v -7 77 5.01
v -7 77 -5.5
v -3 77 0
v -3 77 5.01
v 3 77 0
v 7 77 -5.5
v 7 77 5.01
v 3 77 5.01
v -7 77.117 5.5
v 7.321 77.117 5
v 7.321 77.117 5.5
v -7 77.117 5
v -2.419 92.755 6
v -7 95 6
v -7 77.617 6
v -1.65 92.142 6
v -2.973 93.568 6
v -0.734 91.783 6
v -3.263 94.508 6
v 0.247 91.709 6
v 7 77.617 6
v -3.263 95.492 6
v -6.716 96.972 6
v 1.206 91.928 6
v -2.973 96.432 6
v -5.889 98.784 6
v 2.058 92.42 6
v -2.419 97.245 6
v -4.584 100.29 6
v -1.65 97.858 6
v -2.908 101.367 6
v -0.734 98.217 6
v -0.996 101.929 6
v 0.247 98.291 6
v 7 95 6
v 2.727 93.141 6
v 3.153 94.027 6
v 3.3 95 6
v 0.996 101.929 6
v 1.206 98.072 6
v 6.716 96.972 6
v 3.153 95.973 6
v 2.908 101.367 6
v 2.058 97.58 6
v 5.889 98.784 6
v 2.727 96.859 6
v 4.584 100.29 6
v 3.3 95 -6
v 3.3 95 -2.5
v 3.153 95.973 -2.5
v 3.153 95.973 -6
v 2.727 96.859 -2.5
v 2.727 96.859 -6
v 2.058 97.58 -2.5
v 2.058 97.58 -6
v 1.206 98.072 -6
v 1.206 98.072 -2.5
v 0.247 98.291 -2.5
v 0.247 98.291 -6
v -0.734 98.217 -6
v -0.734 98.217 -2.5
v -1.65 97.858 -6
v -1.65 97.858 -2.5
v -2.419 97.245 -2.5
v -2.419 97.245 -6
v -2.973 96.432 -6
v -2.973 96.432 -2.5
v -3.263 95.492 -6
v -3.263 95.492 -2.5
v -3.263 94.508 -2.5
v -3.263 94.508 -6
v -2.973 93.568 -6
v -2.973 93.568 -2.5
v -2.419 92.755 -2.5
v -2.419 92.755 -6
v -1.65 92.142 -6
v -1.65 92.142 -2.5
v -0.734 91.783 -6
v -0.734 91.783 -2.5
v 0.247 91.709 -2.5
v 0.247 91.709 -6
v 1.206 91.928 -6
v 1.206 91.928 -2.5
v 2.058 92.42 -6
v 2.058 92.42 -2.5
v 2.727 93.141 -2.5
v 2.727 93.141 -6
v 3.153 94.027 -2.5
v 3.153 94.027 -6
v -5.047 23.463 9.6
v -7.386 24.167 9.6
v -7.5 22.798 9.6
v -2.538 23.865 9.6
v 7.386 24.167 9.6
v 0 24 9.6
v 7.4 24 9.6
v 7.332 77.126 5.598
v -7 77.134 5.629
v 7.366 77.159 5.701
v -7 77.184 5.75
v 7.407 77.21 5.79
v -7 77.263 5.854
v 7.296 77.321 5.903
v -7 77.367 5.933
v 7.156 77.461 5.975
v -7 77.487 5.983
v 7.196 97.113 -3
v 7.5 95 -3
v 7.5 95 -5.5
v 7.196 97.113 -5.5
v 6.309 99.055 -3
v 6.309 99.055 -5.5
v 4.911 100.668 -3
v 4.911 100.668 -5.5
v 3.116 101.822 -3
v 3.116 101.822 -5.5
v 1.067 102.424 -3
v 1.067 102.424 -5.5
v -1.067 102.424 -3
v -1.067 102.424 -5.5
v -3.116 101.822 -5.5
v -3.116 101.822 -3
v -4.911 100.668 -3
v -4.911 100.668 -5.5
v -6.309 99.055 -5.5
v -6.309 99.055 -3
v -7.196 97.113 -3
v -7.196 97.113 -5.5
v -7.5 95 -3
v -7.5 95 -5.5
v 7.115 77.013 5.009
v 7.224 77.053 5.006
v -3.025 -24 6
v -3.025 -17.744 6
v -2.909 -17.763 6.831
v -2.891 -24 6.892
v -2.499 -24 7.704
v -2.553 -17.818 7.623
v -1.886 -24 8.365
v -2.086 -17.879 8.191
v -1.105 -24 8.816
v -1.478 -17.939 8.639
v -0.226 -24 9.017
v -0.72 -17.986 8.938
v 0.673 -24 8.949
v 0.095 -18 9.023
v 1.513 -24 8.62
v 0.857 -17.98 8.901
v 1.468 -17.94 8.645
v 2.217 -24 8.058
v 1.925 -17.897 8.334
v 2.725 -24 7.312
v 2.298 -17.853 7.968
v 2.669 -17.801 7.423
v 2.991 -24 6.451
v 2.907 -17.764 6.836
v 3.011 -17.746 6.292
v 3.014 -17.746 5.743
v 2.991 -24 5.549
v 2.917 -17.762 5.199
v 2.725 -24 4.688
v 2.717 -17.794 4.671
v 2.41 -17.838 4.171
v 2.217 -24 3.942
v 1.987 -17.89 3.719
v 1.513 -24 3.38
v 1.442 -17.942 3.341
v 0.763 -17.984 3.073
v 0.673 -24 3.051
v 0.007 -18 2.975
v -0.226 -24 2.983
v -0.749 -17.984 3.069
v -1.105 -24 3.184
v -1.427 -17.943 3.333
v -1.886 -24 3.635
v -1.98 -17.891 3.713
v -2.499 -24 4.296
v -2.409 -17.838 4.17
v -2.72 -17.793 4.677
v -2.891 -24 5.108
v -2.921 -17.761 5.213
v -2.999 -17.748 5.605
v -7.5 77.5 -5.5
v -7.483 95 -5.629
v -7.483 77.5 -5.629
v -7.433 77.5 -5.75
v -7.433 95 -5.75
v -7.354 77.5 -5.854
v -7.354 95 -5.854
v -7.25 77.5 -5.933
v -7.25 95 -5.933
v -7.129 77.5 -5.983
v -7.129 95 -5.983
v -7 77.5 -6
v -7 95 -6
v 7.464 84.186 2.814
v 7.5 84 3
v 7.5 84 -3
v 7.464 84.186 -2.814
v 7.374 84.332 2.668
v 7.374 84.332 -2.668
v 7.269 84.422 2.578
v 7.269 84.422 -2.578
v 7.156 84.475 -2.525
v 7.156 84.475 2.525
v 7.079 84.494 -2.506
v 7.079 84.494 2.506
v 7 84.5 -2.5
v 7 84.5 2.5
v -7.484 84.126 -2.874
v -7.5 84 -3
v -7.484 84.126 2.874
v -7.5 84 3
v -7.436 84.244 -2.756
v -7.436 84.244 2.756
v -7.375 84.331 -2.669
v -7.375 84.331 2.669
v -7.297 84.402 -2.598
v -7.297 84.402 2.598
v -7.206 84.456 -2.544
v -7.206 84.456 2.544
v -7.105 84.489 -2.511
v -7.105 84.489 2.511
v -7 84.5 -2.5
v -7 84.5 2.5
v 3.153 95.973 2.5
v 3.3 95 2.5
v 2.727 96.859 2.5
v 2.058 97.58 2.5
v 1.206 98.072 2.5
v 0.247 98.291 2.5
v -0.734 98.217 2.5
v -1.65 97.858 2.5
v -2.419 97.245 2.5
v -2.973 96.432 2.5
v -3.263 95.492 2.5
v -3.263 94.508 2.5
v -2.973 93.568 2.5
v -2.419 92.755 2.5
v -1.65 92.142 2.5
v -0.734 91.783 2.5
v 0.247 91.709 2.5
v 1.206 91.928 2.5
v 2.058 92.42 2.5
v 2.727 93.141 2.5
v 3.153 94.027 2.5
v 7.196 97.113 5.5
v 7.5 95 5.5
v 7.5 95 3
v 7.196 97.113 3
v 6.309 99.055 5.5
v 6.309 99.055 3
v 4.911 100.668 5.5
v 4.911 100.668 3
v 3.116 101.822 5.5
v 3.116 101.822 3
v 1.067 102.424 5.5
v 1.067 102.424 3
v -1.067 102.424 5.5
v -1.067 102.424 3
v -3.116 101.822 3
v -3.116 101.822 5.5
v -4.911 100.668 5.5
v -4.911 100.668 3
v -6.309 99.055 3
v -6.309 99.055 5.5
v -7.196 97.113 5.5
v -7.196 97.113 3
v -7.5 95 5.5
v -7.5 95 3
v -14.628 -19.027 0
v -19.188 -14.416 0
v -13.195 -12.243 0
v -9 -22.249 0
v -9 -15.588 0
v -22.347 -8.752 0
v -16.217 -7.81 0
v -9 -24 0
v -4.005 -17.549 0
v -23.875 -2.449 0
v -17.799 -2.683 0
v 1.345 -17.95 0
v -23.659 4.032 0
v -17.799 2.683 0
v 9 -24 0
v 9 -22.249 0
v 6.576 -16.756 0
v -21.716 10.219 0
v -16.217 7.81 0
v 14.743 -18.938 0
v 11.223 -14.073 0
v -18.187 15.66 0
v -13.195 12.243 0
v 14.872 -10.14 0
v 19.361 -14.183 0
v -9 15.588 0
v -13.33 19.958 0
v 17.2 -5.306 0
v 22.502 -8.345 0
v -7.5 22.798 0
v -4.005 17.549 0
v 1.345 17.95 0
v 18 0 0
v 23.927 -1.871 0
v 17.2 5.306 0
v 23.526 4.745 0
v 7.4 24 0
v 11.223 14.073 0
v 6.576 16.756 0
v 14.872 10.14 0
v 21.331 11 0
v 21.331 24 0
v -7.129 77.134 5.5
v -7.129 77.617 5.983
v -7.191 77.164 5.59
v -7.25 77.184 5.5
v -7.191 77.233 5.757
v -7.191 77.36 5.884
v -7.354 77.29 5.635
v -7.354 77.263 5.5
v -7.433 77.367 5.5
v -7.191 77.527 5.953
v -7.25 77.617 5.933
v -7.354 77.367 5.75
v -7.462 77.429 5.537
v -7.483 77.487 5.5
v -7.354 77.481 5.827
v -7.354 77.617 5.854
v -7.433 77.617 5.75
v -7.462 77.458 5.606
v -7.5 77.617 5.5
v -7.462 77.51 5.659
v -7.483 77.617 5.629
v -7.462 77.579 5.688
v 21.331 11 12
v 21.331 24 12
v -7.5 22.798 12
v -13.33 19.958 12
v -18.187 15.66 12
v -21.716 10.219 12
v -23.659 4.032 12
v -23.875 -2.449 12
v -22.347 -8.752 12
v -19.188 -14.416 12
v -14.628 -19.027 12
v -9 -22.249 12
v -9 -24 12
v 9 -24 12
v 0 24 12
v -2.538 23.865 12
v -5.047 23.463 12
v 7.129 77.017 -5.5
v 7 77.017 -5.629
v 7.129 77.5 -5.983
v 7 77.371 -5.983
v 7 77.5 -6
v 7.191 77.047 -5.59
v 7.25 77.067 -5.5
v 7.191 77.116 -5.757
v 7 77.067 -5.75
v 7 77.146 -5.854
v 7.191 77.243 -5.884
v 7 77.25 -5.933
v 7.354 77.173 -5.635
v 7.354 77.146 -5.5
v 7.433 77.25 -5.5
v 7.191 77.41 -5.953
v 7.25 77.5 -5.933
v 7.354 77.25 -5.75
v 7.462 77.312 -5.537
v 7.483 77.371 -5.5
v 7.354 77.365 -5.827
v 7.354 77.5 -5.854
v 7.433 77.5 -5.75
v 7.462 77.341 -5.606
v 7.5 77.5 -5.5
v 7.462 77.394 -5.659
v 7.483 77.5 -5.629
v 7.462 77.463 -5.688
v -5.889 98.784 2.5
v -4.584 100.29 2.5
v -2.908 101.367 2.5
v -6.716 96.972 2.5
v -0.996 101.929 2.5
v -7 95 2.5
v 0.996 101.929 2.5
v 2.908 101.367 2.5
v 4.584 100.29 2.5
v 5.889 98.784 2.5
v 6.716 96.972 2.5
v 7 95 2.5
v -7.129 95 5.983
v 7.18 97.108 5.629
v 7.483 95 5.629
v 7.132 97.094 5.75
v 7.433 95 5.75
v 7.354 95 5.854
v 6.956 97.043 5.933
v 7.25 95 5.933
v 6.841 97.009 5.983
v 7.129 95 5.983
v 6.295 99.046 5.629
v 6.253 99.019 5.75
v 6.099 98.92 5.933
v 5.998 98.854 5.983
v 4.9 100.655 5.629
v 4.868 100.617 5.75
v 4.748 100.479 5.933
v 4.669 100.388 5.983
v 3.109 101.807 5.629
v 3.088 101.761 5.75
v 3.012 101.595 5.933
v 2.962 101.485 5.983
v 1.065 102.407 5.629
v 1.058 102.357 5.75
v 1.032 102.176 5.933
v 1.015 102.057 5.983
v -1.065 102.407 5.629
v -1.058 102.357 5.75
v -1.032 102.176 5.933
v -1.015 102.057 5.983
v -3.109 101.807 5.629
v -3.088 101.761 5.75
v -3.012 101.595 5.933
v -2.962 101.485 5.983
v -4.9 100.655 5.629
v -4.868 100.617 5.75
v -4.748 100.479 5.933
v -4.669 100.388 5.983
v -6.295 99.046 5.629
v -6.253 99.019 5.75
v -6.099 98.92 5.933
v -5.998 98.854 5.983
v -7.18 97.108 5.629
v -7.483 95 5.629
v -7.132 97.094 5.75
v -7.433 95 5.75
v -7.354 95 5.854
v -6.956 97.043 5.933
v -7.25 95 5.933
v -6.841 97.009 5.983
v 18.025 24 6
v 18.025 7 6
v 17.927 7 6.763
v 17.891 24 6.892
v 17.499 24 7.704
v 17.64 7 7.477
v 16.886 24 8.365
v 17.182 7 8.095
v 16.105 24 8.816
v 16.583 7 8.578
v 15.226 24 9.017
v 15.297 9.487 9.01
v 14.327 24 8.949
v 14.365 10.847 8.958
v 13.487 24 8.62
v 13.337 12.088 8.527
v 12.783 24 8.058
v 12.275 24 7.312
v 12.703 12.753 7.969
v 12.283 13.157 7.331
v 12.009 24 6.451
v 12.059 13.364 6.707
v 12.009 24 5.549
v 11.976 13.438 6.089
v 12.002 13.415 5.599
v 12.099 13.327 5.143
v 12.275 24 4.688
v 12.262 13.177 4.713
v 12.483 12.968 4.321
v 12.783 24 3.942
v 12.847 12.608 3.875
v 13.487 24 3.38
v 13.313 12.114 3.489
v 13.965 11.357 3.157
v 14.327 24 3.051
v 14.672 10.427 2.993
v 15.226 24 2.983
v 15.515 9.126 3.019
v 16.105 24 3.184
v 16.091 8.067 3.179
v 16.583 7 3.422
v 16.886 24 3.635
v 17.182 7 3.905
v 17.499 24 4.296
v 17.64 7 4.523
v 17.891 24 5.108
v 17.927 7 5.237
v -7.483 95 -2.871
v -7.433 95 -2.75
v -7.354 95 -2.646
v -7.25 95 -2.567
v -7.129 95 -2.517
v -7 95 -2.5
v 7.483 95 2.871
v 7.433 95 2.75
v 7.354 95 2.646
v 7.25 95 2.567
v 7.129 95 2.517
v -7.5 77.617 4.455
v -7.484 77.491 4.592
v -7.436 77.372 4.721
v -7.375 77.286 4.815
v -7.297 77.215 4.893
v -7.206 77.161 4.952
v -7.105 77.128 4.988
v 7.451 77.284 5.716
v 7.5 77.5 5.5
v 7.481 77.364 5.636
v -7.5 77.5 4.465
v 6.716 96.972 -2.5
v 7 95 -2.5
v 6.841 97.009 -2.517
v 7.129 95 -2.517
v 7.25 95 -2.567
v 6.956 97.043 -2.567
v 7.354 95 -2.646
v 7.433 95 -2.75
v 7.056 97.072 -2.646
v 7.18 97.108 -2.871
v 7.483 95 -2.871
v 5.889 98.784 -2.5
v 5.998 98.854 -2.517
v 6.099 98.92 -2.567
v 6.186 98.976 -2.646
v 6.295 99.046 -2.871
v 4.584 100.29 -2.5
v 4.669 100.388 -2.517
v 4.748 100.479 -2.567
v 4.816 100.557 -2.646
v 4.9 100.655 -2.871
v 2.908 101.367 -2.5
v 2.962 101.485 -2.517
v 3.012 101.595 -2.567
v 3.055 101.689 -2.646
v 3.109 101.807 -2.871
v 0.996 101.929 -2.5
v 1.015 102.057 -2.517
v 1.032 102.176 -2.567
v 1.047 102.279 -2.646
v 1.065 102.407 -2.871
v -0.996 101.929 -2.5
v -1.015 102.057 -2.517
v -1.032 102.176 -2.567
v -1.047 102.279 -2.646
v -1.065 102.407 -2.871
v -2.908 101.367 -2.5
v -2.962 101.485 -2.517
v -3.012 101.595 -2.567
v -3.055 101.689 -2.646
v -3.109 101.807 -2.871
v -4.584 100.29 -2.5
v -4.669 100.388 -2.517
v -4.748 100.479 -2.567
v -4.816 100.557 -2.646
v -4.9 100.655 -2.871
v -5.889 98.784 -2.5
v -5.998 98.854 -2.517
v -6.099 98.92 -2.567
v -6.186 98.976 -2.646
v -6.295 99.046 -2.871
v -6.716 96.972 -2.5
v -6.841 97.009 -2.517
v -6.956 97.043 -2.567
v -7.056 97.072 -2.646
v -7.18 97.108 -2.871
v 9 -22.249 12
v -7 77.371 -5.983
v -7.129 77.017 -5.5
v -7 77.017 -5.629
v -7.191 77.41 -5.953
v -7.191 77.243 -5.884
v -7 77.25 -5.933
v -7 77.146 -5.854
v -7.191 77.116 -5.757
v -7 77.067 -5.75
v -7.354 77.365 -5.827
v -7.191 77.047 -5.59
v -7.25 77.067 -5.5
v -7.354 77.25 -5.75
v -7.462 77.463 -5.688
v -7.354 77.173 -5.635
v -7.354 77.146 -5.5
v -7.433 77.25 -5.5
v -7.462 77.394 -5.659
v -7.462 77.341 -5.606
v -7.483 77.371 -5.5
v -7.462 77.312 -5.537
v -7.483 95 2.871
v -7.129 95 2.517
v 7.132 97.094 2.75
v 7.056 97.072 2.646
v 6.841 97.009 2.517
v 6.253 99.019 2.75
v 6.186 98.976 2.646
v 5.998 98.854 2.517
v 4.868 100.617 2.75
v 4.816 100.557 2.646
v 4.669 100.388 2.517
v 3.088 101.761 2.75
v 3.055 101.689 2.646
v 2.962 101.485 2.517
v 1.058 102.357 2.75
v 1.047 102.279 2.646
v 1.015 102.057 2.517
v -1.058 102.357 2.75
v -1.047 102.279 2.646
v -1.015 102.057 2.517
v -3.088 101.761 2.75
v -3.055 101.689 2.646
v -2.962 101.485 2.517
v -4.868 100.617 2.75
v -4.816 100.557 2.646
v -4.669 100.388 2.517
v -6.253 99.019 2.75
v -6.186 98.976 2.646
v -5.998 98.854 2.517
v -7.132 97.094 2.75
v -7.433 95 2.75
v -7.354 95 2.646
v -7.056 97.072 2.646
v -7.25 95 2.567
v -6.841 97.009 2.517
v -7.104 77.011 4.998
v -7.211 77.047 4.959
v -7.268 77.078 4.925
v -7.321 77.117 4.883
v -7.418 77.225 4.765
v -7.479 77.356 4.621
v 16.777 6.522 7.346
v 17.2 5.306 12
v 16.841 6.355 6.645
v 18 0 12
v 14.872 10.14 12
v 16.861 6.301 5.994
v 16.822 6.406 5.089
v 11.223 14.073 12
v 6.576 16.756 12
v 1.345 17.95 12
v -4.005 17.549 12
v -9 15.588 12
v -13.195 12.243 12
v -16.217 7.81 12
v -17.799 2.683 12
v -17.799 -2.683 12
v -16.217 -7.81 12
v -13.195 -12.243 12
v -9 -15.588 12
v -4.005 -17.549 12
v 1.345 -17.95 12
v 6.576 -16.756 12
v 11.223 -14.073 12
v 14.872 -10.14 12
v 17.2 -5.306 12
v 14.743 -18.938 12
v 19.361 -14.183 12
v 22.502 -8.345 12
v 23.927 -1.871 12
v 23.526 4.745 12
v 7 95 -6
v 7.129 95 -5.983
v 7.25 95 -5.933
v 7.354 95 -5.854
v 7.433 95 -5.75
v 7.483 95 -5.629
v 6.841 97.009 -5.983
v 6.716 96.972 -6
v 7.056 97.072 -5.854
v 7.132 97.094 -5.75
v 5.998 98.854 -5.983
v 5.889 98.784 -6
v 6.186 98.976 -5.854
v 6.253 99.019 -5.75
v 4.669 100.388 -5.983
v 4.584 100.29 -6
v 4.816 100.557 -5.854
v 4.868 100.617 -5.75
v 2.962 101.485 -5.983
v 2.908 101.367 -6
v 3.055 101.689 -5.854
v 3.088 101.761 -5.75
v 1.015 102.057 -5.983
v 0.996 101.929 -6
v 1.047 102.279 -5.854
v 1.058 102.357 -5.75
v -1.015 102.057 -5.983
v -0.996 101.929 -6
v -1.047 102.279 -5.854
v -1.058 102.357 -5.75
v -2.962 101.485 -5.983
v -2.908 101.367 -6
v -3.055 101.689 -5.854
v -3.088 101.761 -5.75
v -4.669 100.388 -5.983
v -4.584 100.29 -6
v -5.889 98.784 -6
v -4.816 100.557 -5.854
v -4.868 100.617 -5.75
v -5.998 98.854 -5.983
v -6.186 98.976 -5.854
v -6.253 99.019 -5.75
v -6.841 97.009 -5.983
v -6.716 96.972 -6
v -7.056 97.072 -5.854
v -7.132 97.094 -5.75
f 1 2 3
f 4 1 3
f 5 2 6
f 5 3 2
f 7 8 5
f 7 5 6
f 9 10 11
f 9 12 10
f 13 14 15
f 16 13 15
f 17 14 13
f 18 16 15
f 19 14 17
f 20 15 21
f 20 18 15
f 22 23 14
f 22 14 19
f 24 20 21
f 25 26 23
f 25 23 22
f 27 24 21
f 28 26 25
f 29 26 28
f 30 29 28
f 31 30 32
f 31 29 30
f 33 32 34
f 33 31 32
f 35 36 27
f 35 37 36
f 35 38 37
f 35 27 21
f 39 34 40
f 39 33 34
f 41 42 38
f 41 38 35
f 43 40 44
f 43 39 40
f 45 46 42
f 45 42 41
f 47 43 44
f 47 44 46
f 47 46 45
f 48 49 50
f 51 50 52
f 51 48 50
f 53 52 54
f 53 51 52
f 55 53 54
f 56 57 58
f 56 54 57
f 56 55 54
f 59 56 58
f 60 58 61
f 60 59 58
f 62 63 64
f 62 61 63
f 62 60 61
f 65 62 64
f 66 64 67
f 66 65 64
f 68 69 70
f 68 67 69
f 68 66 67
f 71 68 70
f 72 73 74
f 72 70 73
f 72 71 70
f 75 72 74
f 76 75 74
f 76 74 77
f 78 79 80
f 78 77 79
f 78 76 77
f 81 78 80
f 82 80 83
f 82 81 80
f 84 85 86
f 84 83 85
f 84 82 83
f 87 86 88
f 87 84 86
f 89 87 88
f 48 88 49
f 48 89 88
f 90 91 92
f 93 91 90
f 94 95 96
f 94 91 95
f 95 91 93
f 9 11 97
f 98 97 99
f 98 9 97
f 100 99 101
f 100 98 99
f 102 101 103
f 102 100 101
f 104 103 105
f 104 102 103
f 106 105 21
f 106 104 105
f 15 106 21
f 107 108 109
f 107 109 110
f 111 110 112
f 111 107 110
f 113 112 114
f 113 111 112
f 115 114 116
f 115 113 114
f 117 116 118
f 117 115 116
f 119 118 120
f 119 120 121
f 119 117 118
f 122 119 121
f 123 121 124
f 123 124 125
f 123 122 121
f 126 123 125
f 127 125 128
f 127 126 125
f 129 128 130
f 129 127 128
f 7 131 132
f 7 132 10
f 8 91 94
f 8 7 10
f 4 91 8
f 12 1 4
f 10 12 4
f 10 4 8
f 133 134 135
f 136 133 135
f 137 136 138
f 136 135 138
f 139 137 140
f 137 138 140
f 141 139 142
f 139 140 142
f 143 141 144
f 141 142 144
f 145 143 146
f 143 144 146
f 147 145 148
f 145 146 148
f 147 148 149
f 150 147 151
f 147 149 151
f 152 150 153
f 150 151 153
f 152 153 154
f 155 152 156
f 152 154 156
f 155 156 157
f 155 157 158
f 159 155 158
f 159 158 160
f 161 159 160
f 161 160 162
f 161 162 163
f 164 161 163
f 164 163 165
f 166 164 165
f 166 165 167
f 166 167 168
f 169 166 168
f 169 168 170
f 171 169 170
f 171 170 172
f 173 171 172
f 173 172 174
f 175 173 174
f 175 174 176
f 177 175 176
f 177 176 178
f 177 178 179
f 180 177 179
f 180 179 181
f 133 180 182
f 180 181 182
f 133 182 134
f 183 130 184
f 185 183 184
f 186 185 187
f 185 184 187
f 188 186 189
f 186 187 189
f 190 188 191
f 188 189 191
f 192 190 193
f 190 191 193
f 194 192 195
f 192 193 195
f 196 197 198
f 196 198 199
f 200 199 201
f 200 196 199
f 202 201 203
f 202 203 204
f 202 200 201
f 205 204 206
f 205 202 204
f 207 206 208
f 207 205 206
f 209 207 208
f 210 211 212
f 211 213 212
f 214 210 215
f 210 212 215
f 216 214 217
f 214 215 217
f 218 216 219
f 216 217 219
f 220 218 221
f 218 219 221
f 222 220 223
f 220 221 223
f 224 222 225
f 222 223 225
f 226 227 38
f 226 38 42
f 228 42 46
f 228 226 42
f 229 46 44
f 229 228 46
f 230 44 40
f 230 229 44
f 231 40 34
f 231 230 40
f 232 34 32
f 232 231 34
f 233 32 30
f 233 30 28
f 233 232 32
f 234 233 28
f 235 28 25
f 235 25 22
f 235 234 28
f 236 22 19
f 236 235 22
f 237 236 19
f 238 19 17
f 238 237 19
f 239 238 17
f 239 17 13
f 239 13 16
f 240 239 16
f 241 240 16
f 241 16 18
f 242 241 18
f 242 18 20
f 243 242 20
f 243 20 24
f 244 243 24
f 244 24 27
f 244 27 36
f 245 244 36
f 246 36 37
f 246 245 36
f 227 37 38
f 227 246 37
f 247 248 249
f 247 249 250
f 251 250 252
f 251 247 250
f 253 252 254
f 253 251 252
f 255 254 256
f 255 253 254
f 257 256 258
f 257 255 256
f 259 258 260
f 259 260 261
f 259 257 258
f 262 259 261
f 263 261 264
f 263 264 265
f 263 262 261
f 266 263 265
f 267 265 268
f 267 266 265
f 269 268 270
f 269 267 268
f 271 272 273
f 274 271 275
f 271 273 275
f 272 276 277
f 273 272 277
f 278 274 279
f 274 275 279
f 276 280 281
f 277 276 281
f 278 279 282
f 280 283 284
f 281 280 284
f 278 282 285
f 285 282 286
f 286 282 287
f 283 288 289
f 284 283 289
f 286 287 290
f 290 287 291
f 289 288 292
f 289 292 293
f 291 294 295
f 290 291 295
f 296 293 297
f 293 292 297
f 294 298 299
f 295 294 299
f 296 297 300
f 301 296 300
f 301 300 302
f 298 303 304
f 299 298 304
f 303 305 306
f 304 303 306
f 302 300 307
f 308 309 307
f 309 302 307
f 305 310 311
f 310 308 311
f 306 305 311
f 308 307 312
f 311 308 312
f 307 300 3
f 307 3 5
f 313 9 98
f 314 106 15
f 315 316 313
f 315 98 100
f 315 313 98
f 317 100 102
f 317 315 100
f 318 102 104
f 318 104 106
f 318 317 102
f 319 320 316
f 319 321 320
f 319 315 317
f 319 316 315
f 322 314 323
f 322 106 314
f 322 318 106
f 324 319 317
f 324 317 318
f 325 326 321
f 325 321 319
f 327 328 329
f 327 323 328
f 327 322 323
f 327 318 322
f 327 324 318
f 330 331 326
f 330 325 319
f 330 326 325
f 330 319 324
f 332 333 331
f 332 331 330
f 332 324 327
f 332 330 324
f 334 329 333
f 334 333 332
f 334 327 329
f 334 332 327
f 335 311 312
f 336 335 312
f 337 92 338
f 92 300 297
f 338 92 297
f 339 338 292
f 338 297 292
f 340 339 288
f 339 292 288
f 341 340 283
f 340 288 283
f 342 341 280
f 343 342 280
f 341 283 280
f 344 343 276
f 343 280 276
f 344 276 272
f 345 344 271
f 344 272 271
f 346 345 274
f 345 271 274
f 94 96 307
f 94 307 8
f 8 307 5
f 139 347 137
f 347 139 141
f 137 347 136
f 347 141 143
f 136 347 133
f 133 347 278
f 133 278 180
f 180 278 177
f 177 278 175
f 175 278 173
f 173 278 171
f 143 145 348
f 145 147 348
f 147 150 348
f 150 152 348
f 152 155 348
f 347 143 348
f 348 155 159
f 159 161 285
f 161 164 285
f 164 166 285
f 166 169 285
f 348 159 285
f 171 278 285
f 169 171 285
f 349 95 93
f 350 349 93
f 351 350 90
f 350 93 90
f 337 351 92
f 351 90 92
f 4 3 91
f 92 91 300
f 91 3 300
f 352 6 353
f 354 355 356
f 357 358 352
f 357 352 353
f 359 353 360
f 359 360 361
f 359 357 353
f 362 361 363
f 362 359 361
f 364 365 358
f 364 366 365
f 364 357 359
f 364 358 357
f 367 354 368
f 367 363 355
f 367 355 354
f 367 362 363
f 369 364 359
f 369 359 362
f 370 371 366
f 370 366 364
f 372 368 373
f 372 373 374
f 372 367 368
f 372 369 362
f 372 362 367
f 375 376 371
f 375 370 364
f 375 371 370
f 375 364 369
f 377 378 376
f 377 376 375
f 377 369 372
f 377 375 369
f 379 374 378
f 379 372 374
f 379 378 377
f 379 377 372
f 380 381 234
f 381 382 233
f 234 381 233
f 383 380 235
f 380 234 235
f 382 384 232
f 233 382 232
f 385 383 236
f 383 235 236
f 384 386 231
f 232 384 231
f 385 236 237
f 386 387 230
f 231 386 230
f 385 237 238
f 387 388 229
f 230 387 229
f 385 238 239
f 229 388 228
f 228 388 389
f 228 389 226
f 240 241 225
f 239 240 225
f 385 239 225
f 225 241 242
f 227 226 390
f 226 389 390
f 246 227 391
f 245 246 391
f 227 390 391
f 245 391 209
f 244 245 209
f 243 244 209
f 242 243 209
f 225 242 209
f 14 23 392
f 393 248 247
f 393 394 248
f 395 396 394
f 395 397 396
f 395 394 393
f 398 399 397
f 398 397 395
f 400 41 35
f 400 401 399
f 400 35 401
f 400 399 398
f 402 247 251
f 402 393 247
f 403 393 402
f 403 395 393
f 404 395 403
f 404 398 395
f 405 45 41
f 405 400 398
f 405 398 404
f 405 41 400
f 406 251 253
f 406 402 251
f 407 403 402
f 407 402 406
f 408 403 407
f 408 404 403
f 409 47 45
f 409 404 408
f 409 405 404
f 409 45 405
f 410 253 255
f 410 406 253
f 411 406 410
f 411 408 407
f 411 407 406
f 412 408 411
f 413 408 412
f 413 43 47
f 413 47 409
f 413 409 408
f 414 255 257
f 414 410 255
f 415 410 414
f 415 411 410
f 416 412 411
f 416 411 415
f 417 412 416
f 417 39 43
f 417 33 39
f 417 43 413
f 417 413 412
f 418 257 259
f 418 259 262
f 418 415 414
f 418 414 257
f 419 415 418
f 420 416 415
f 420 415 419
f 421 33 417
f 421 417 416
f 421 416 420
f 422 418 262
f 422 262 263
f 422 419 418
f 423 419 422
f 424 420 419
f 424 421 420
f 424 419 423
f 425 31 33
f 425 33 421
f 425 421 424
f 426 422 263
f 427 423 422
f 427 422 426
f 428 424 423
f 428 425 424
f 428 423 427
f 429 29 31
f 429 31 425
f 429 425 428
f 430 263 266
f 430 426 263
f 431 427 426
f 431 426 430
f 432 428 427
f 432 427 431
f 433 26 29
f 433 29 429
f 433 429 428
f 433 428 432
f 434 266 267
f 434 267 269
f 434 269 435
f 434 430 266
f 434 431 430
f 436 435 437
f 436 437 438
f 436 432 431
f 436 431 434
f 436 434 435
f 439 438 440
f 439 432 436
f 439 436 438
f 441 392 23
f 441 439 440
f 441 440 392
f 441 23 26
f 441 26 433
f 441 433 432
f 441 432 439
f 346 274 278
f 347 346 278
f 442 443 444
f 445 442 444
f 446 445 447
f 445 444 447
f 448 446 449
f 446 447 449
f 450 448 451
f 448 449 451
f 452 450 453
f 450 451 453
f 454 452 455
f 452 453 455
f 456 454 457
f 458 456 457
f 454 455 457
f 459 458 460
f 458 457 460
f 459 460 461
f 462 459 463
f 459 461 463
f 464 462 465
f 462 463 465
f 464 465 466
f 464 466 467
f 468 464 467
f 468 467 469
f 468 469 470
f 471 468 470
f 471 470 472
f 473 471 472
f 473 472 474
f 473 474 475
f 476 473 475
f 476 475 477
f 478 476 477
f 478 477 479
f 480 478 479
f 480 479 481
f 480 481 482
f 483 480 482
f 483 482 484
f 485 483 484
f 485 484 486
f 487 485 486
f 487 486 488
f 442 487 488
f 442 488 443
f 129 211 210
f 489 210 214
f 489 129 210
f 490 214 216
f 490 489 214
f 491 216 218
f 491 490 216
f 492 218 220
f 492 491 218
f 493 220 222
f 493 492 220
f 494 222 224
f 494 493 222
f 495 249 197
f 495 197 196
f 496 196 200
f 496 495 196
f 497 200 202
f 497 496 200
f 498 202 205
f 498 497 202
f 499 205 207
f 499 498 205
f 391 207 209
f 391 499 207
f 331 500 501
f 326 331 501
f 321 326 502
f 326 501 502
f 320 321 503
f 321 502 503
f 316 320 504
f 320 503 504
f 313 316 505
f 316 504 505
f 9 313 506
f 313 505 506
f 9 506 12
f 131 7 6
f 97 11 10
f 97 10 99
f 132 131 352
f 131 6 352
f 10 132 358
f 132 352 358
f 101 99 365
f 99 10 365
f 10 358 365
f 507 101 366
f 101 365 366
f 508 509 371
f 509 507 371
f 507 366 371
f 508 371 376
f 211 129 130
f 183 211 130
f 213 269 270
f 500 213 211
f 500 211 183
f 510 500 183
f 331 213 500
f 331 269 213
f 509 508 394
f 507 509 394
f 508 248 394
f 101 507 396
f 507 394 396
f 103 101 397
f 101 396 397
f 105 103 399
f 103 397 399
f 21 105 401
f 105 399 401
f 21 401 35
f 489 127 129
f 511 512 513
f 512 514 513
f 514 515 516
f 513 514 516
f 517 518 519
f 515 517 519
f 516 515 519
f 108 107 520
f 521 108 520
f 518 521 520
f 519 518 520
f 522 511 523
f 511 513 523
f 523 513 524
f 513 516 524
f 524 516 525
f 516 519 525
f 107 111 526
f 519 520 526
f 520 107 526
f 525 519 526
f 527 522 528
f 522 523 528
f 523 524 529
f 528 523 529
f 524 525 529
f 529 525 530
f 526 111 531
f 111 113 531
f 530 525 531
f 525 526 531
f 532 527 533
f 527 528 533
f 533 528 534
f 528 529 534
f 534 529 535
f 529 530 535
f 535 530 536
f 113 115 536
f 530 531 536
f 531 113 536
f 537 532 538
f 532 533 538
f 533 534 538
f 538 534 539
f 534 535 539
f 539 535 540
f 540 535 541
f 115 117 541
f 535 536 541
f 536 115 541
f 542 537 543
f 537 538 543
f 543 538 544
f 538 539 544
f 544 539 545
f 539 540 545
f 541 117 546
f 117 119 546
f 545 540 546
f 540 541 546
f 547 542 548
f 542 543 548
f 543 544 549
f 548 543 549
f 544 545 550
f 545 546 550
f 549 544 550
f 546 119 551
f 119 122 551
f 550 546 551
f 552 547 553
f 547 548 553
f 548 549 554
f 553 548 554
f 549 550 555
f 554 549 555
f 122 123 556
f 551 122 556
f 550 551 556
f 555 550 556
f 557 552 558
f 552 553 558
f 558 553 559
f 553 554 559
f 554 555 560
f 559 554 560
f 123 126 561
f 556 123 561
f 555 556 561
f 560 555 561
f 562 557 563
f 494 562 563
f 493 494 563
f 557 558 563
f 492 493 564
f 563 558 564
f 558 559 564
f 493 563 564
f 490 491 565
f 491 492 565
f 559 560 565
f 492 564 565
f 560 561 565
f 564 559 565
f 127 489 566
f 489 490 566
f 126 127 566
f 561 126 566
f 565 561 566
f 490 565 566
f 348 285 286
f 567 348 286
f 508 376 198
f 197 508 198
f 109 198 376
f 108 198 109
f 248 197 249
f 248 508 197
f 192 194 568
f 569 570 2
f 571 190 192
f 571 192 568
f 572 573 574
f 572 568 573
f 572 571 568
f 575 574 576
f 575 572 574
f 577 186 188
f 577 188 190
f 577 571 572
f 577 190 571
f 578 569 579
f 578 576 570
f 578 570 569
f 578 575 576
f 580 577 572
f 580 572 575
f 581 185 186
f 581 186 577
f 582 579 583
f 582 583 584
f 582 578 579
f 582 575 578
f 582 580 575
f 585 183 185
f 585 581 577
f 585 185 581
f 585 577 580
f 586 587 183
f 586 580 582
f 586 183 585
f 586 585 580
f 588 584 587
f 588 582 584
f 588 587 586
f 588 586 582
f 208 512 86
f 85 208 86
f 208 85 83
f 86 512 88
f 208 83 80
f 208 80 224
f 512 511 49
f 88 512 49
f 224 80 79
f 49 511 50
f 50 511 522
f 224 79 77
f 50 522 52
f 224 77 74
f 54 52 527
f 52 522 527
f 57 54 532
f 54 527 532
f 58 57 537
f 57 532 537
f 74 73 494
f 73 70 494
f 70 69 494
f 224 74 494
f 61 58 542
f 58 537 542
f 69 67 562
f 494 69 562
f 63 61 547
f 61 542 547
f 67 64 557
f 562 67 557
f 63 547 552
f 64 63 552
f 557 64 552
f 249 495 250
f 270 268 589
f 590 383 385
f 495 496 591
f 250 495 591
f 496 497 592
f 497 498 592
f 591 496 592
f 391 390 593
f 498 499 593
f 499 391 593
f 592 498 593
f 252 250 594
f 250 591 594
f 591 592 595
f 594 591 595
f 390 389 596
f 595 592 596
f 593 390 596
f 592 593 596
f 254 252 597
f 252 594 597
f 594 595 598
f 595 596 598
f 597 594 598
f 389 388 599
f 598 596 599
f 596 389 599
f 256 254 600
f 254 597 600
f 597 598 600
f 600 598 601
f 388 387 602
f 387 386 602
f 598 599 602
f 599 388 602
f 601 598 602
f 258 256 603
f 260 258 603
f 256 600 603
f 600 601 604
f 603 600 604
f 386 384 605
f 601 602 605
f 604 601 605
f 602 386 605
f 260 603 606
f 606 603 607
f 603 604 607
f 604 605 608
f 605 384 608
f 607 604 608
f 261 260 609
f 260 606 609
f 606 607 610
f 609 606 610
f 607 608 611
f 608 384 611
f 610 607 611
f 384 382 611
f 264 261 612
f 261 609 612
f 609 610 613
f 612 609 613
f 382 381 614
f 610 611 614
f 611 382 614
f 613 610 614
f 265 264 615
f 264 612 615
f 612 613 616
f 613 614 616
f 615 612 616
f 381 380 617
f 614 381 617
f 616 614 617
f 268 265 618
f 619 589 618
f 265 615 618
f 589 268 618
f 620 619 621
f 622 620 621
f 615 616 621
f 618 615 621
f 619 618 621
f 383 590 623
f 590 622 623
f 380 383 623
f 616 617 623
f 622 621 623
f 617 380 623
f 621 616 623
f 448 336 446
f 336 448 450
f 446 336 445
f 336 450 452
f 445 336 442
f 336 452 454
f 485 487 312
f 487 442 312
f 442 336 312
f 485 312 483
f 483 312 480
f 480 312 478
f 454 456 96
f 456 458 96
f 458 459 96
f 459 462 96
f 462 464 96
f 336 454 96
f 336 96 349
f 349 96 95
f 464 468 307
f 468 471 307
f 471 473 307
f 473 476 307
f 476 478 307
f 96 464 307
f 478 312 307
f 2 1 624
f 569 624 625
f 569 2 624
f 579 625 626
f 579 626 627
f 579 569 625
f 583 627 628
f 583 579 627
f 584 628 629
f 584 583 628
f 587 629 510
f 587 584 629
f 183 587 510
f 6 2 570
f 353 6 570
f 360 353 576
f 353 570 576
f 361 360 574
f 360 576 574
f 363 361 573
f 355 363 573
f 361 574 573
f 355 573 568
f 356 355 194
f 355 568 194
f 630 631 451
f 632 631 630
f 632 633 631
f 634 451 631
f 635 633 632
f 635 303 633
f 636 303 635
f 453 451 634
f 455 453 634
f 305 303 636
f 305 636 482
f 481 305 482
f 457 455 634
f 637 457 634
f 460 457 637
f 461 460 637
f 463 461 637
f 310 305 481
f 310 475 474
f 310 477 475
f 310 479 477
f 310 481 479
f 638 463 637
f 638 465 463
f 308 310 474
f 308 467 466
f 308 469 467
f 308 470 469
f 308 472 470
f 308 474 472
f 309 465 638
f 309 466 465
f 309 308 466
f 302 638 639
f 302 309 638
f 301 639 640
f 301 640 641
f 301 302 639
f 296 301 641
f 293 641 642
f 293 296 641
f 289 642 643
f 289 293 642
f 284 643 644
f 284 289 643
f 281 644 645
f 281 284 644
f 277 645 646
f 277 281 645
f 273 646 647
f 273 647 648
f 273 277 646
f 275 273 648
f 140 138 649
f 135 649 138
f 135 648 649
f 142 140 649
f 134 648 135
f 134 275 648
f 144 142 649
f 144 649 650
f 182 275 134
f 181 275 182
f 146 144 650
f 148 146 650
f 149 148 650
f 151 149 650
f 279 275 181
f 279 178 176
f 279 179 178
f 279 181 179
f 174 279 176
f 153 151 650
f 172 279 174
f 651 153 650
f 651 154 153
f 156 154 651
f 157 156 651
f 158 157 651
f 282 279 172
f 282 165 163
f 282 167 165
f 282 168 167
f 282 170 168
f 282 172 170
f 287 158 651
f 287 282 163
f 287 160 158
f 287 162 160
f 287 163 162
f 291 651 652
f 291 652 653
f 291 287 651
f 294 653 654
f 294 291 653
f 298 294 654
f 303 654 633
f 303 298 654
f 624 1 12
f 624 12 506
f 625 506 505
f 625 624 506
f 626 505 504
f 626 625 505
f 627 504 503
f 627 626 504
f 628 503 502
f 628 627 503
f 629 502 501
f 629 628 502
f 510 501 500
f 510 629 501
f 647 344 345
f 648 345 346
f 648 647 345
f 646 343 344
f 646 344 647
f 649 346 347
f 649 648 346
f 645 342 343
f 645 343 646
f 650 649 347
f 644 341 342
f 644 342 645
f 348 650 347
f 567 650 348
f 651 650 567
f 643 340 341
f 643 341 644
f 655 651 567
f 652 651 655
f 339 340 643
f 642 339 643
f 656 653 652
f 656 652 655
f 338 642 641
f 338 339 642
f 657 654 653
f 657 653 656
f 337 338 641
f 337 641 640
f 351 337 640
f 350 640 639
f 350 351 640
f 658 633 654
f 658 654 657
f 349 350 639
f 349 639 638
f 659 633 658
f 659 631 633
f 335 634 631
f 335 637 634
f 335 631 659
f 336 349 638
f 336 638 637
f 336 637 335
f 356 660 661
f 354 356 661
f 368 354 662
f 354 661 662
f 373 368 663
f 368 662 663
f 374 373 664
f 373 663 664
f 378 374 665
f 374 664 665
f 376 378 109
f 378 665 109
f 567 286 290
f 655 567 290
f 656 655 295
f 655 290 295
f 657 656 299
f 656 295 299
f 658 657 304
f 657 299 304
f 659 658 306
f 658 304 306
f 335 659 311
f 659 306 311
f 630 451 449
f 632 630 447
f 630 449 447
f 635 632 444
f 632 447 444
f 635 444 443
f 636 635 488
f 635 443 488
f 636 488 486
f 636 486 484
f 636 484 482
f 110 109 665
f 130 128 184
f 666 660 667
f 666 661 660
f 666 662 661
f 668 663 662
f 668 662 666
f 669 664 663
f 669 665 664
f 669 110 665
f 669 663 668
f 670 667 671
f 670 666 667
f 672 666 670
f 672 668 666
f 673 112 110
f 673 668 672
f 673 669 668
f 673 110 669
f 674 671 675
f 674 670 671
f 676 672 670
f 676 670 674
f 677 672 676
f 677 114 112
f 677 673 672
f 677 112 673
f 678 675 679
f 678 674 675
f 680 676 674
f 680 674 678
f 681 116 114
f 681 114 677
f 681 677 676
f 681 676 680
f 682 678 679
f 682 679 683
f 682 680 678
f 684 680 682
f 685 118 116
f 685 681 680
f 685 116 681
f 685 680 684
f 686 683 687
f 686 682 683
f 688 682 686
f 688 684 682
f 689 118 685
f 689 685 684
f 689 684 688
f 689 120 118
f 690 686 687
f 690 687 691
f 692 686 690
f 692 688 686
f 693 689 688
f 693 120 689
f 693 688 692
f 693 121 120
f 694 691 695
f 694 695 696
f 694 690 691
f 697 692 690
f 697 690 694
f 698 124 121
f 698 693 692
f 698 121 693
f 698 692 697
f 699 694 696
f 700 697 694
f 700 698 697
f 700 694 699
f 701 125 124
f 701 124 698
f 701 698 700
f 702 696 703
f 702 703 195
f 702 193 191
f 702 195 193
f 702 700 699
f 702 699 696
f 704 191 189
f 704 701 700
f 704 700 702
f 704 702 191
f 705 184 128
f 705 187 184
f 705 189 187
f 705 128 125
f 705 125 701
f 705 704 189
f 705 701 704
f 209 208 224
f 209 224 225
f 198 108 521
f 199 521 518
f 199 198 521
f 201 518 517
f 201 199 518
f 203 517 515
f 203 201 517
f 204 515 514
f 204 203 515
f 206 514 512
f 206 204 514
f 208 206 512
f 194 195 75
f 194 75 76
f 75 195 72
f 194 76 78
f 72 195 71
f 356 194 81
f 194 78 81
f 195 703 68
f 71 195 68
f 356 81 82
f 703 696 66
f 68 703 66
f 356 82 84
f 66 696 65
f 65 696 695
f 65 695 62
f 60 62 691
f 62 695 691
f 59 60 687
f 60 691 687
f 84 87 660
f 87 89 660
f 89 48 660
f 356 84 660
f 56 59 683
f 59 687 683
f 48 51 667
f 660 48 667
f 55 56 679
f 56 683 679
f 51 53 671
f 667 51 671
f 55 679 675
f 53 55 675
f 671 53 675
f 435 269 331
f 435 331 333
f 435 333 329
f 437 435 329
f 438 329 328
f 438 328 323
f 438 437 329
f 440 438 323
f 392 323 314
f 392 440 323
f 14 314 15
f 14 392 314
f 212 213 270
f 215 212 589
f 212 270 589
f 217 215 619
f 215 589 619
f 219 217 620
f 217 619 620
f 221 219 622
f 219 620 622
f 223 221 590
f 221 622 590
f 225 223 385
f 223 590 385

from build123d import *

# Parameters (mm, degrees)
F0_R           = 18
F1_DEPTH       = 12
F2_DEPTH       = 9.6
F0_R_2         = 3.3
F3_DEPTH       = 6
F3_DEPTH_BACK  = 6
F5_DEPTH       = 25
F5_DEPTH_BACK  = 25
F6_W           = 10.5
F6_H           = 5
F6_W_2         = 7.5
F7_DEPTH       = 25
F9_D           = 5
F9_DEPTH       = 17
F9_TIP         = 1.5021515476
F11_D          = 5
F11_DEPTH      = 17
F11_TIP        = 1.5021515476
F12_D          = 6.05
F12_DEPTH      = 17
F12_TIP        = 1.8176033726
F13_D          = 6.05
F13_DEPTH      = 17
F13_TIP        = 1.8176033726
F14_T1_DEPTH   = 5
F14_T3_DEPTH   = 10.5
F14_T5_DEPTH   = 17.5
F14_T7_DEPTH   = 11.7601440108
F14_T9_DEPTH   = 17.3832349181
F14_T11_DEPTH  = 14
F14_T13_DEPTH  = 19.1332349181
F14_T15_DEPTH  = 15.75
F14_S19_W      = 0.5
F14_S19_H      = 0.5
F14_T20_DEPTH  = 0.5
F14_S25_W      = 0.5
F14_S25_H      = 0.5
F14_T26_DEPTH  = 0.5
F14_S31_W      = 0.5
F14_S31_H      = 0.5
F14_T32_DEPTH  = 0.5
F14_T36_ANGLE  = 180
F14_T38_ANGLE  = 180
F14_T40_ANGLE  = 180
F14_T42_ANGLE  = 180
F14_T46_DEPTH  = 2.617204886
F14_T51_DEPTH  = 1.75
F14_T57_DEPTH  = 11.75
F14_T61_DEPTH  = 6.25
F14_T68_DEPTH  = 6.25
F14_T72_DEPTH  = 11.75
F14_T79_DEPTH  = 2.617204886
F14_T83_DEPTH  = 1.75
F14_T90_DEPTH  = 6.25
F14_T94_DEPTH  = 11.75
F14_T101_DEPTH = 11.75
F14_T105_DEPTH = 6.25


# Not quite as in the source:
# - a fillet or chamfer that OpenCascade refuses, or shapes differently, is made with other operations: its cross-section is extruded or revolved along the edge and cut away or added


with BuildPart() as f1:
    # F0 (on Top) → F1 (new body)
    with BuildSketch(Plane.XY):
        with BuildLine():
            Line((9, -24), (9, -22.2485954613))
            ThreePointArc((9, -22.2485954613), (22.5023455571, -8.3453247048), (21.3307290077, 11))
            Line((21.3307290077, 11), (21.3307290077, 24))
            Line((21.3307290077, 24), (7.4002087639, 24))
            Line((7.4002087639, 24), (0, 24))
            ThreePointArc((0, 24), (-3.7978527138, 23.6976014559), (-7.5, 22.7980262304))
            ThreePointArc((-7.5, 22.7980262304), (-23.9867053064, 0.7987293299), (-9, -22.2485954613))
            Line((-9, -22.2485954613), (-9, -24))
            Line((-9, -24), (9, -24))
        make_face()
        Circle(F0_R, mode=Mode.SUBTRACT)
    extrude(amount=F1_DEPTH)

    # F0 (on Top) → F2 (join)
    with BuildSketch(Plane.XY):
        with BuildLine():
            Line((0, 24), (7.4002087639, 24))
            Line((7.4002087639, 24), (3, 77))
            Line((3, 77), (-3, 77))
            Line((-3, 77), (-7.5, 22.7980262304))
            ThreePointArc((-7.5, 22.7980262304), (-3.7978527138, 23.6976014559), (0, 24))
        make_face()
    extrude(amount=F2_DEPTH)

    # F0 (on Top) → F3 (join, two sides)
    with BuildSketch(Plane.XY) as f3_sk:
        with BuildLine():
            Line((-3, 77), (3, 77))
            Line((3, 77), (7.5, 77))
            Line((7.5, 77), (7.5, 95))
            ThreePointArc((7.5, 95), (0, 102.5), (-7.5, 95))
            Line((-7.5, 95), (-7.5, 77))
            Line((-7.5, 77), (-3, 77))
        make_face()
        with Locations((0, 95)):
            Circle(F0_R_2, mode=Mode.SUBTRACT)
    extrude(amount=F3_DEPTH)
    extrude(f3_sk.sketch, amount=-F3_DEPTH_BACK)

    # F4 (on Right) → F5 (cut, two sides)
    with BuildSketch(Plane.YZ) as f5_sk:
        Polygon((24.0342058241, 9.6115674824), (77.1167650819, 5), (77.1167650819, 9.6115674824), align=None)
    extrude(amount=-F5_DEPTH, mode=Mode.SUBTRACT)
    extrude(f5_sk.sketch, amount=F5_DEPTH_BACK, mode=Mode.SUBTRACT)

    # F6 (on face) → F7 (cut)
    with BuildSketch(Plane.YZ.offset(7.5)):
        with Locations((89.75, 0)):
            Rectangle(F6_W, F6_H)
        with Locations((98.75, 0)):
            Rectangle(F6_W_2, F6_H)
    extrude(amount=-F7_DEPTH, mode=Mode.SUBTRACT)

    # F9
    with Locations(Plane.XZ.offset(24)):
        with Locations((0, 6)):
            Hole(F9_D / 2, depth=F9_DEPTH)
            with Locations((0, 0, -(F9_DEPTH + F9_TIP / 2))):  # 118° drill point
                Cone(0, F9_D / 2, F9_TIP, mode=Mode.SUBTRACT)

    # F11
    with Locations(Plane(origin=(0, 24, 0), x_dir=(-1, 0, 0), z_dir=(0, 1, 0))):
        with Locations((-15, 6)):
            Hole(F11_D / 2, depth=F11_DEPTH)
            with Locations((0, 0, -(F11_DEPTH + F11_TIP / 2))):  # 118° drill point
                Cone(0, F11_D / 2, F11_TIP, mode=Mode.SUBTRACT)

    # F12
    with Locations(Plane(origin=(0, 24, 0), x_dir=(-1, 0, 0), z_dir=(0, 1, 0))):
        with Locations((-15, 6)):
            Hole(F12_D / 2, depth=F12_DEPTH)
            with Locations((0, 0, -(F12_DEPTH + F12_TIP / 2))):  # 118° drill point
                Cone(0, F12_D / 2, F12_TIP, mode=Mode.SUBTRACT)

    # F13
    with Locations(Plane.XZ.offset(24)):
        with Locations((0, 6)):
            Hole(F13_D / 2, depth=F13_DEPTH)
            with Locations((0, 0, -(F13_DEPTH + F13_TIP / 2))):  # 118° drill point
                Cone(0, F13_D / 2, F13_TIP, mode=Mode.SUBTRACT)

    # F14: fillet of radius 0.5 on 22 edges, made by hand

    # F14_s2 → F14_t1 (cut)
    with BuildSketch(Plane.XY.offset(-2.5)):
        with BuildLine():
            ThreePointArc((-7.5, 84), (-7.3535533906, 84.3535533906), (-7, 84.5))
            Line((-7, 84.5), (-7.5, 84.5))
            Line((-7.5, 84.5), (-7.5, 84))
        make_face()
        with BuildLine():
            ThreePointArc((7.5, 84), (7.3535533906, 84.3535533906), (7, 84.5))
            Line((7, 84.5), (7.5, 84.5))
            Line((7.5, 84.5), (7.5, 84))
        make_face()
    extrude(amount=F14_T1_DEPTH, mode=Mode.SUBTRACT)

    # F14_s4 → F14_t3 (cut)
    with BuildSketch(Plane.XZ.offset(-95)):
        with BuildLine():
            ThreePointArc((-7.5, 3), (-7.3535533906, 2.6464466094), (-7, 2.5))
            Line((-7, 2.5), (-7.5, 2.5))
            Line((-7.5, 2.5), (-7.5, 3))
        make_face()
        with BuildLine():
            ThreePointArc((-7.5, -3), (-7.3535533906, -2.6464466094), (-7, -2.5))
            Line((-7, -2.5), (-7.5, -2.5))
            Line((-7.5, -2.5), (-7.5, -3))
        make_face()
        with BuildLine():
            ThreePointArc((7.5, -3), (7.3535533906, -2.6464466094), (7, -2.5))
            Line((7, -2.5), (7.5, -2.5))
            Line((7.5, -2.5), (7.5, -3))
        make_face()
        with BuildLine():
            ThreePointArc((7.5, 3), (7.3535533906, 2.6464466094), (7, 2.5))
            Line((7, 2.5), (7.5, 2.5))
            Line((7.5, 2.5), (7.5, 3))
        make_face()
    extrude(amount=F14_T3_DEPTH, mode=Mode.SUBTRACT)

    # F14_s6 → F14_t5 (cut)
    with BuildSketch(Plane.XZ.offset(-95)):
        with BuildLine():
            ThreePointArc((-7.5, -5.5), (-7.3535533906, -5.8535533906), (-7, -6))
            Line((-7, -6), (-7.5, -6))
            Line((-7.5, -6), (-7.5, -5.5))
        make_face()
        with BuildLine():
            ThreePointArc((7, -6), (7.3535533906, -5.8535533906), (7.5, -5.5))
            Line((7.5, -5.5), (7.5, -6))
            Line((7.5, -6), (7, -6))
        make_face()
    extrude(amount=F14_T5_DEPTH, mode=Mode.SUBTRACT)

    # F14_s8 → F14_t7 (cut)
    with BuildSketch(Plane.XY.offset(-5.5)):
        with BuildLine():
            ThreePointArc((-7, 77), (-7.3535533906, 77.1464466094), (-7.5, 77.5))
            Line((-7.5, 77.5), (-7.5, 77))
            Line((-7.5, 77), (-7, 77))
        make_face()
        with BuildLine():
            ThreePointArc((7, 77), (7.3535533906, 77.1464466094), (7.5, 77.5))
            Line((7.5, 77.5), (7.5, 77))
            Line((7.5, 77), (7, 77))
        make_face()
    extrude(amount=F14_T7_DEPTH, mode=Mode.SUBTRACT)

    # F14_s10 → F14_t9 (cut)
    with BuildSketch(Plane.XZ.offset(-95)):
        with BuildLine():
            ThreePointArc((-7.5, 5.5), (-7.3535533906, 5.8535533906), (-7, 6))
            Line((-7, 6), (-7.5, 6))
            Line((-7.5, 6), (-7.5, 5.5))
        make_face()
    extrude(amount=F14_T9_DEPTH, mode=Mode.SUBTRACT)

    # F14_s12 → F14_t11 (cut)
    with BuildSketch(Plane.YZ.offset(-7)):
        with BuildLine():
            ThreePointArc((77, -5.5), (77.1464466094, -5.8535533906), (77.5, -6))
            Line((77.5, -6), (77, -6))
            Line((77, -6), (77, -5.5))
        make_face()
    extrude(amount=F14_T11_DEPTH, mode=Mode.SUBTRACT)

    # F14_s14 → F14_t13 (cut)
    with BuildSketch(Plane.XZ.offset(-95)):
        with BuildLine():
            ThreePointArc((7.5, 5.5), (7.3535533906, 5.8535533906), (7, 6))
            Line((7, 6), (7.5, 6))
            Line((7.5, 6), (7.5, 5.5))
        make_face()
    extrude(amount=F14_T13_DEPTH, mode=Mode.SUBTRACT)

    # F14_s16 → F14_t15 (cut)
    with BuildSketch(Plane.YZ.offset(-7)):
        with BuildLine():
            ThreePointArc((77.1167650819, 5.5), (77.2632116913, 5.8535533906), (77.6167650819, 6))
            Line((77.6167650819, 6), (77.1167650819, 6))
            Line((77.1167650819, 6), (77.1167650819, 5.5))
        make_face()
    extrude(amount=F14_T15_DEPTH, mode=Mode.SUBTRACT)


with BuildPart() as f14_tool18:
    # F14_s19 → F14_t20 (new body)
    with BuildSketch(Plane.YZ.offset(-7)):
        with Locations((77.25, -5.75)):
            Rectangle(F14_S19_W, F14_S19_H)
    extrude(amount=-F14_T20_DEPTH)

    # F14_s21 → F14_t22 (revolve, cut)
    with BuildSketch(Plane(origin=(-7, 77.5, -5.5), x_dir=(0, 0.7071067812, 0.7071067812), z_dir=(0, -0.7071067812, 0.7071067812))):
        with BuildLine():
            ThreePointArc((0, -0.5), (0.5, 0), (0, 0.5))
            Line((0, 0.5), (0, -0.5))
        make_face()
    revolve(axis=Axis((-7, 77.5, -5.5), (-1, 0, 0)), mode=Mode.SUBTRACT)


with BuildPart() as f1_1:
    add(f1.part)

    # F14_t17: cut F14_tool18
    add(f14_tool18.part, mode=Mode.SUBTRACT)


with BuildPart() as f14_tool24:
    # F14_s25 → F14_t26 (new body)
    with BuildSketch(Plane.YZ.offset(-7)):
        with Locations((77.3667650819, 5.75)):
            Rectangle(F14_S25_W, F14_S25_H)
    extrude(amount=-F14_T26_DEPTH)

    # F14_s27 → F14_t28 (revolve, cut)
    with BuildSketch(Plane(origin=(-7, 77.6167650819, 5.5), x_dir=(0, 0.7071067812, -0.7071067812), z_dir=(0, 0.7071067812, 0.7071067812))):
        with BuildLine():
            ThreePointArc((0, -0.5), (0.5, 0), (0, 0.5))
            Line((0, 0.5), (0, -0.5))
        make_face()
    revolve(axis=Axis((-7, 77.6167650819, 5.5), (-1, 0, 0)), mode=Mode.SUBTRACT)


with BuildPart() as f1_2:
    add(f1_1.part)

    # F14_t23: cut F14_tool24
    add(f14_tool24.part, mode=Mode.SUBTRACT)


with BuildPart() as f14_tool30:
    # F14_s31 → F14_t32 (new body)
    with BuildSketch(Plane.YZ.offset(7)):
        with Locations((77.25, -5.75)):
            Rectangle(F14_S31_W, F14_S31_H)
    extrude(amount=F14_T32_DEPTH)

    # F14_s33 → F14_t34 (revolve, cut)
    with BuildSketch(Plane(origin=(7, 77.5, -5.5), x_dir=(0, 0.7071067812, 0.7071067812), z_dir=(0, 0.7071067812, -0.7071067812))):
        with BuildLine():
            ThreePointArc((0, -0.5), (0.5, 0), (0, 0.5))
            Line((0, 0.5), (0, -0.5))
        make_face()
    revolve(axis=Axis((7, 77.5, -5.5), (1, 0, 0)), mode=Mode.SUBTRACT)


with BuildPart() as f1_3:
    add(f1_2.part)

    # F14_t29: cut F14_tool30
    add(f14_tool30.part, mode=Mode.SUBTRACT)

    # F14_s35 → F14_t36 (revolve, cut)
    with BuildSketch(Plane.XZ.offset(-95)):
        with BuildLine():
            ThreePointArc((7, -2.5), (7.3535533906, -2.6464466094), (7.5, -3))
            Line((7.5, -3), (7.5, -2.5))
            Line((7.5, -2.5), (7, -2.5))
        make_face()
    revolve(axis=Axis((0, 95, -2.5), (0, 0, 1)), revolution_arc=F14_T36_ANGLE, mode=Mode.SUBTRACT)

    # F14_s37 → F14_t38 (revolve, cut)
    with BuildSketch(Plane.XZ.offset(-95)):
        with BuildLine():
            ThreePointArc((7.5, 3), (7.3535533906, 2.6464466094), (7, 2.5))
            Line((7, 2.5), (7.5, 2.5))
            Line((7.5, 2.5), (7.5, 3))
        make_face()
    revolve(axis=Axis((0, 95, 2.5), (0, 0, 1)), revolution_arc=F14_T38_ANGLE, mode=Mode.SUBTRACT)

    # F14_s39 → F14_t40 (revolve, cut)
    with BuildSketch(Plane.XZ.offset(-95)):
        with BuildLine():
            ThreePointArc((7.5, 5.5), (7.3535533906, 5.8535533906), (7, 6))
            Line((7, 6), (7.5, 6))
            Line((7.5, 6), (7.5, 5.5))
        make_face()
    revolve(axis=Axis((0, 95, 6), (0, 0, 1)), revolution_arc=F14_T40_ANGLE, mode=Mode.SUBTRACT)

    # F14_s41 → F14_t42 (revolve, cut)
    with BuildSketch(Plane.XZ.offset(-95)):
        with BuildLine():
            ThreePointArc((7, -6), (7.3535533906, -5.8535533906), (7.5, -5.5))
            Line((7.5, -5.5), (7.5, -6))
            Line((7.5, -6), (7, -6))
        make_face()
    revolve(axis=Axis((0, 95, -6), (0, 0, 1)), revolution_arc=F14_T42_ANGLE, mode=Mode.SUBTRACT)


with BuildPart() as f14_tool44:
    # F14_s45 → F14_t46 (new body)
    with BuildSketch(Plane(origin=(0, 74.74590152, -6.4935785634), x_dir=(1, 0, 0), z_dir=(0, 0.9962475616, -0.086549385))):
        with BuildLine():
            ThreePointArc((-7, -11.6556464009), (-7.3535533906, -11.5091997915), (-7.5, -11.1556464009))
            Line((-7.5, -11.1556464009), (-7.5, -11.6556464009))
            Line((-7.5, -11.6556464009), (-7, -11.6556464009))
        make_face()
    extrude(amount=F14_T46_DEPTH)

    split(bisect_by=Plane.XZ.offset(-77.1167650819), keep=Keep.TOP)


with BuildPart() as f1_4:
    add(f1_3.part)

    # F14_t43: cut F14_tool44
    add(f14_tool44.part, mode=Mode.SUBTRACT)


with BuildPart() as f14_tool49:
    # F14_s50 → F14_t51 (new body)
    with BuildSketch(Plane.XY.offset(3.75)):
        with BuildLine():
            ThreePointArc((-7.5, 77.6167650819), (-7.3535533906, 77.2632116913), (-7, 77.1167650819))
            Line((-7, 77.1167650819), (-7.5, 77.1167650819))
            Line((-7.5, 77.1167650819), (-7.5, 77.6167650819))
        make_face()
    extrude(amount=F14_T51_DEPTH)

    split(bisect_by=Plane(origin=(0, 1.0087890281, 11.6119093055), x_dir=(1, 0, 0), z_dir=(0, 0.086549385, 0.9962475616)), keep=Keep.TOP)


with BuildPart() as f1_5:
    add(f1_4.part)

    # F14_t48: cut F14_tool49
    add(f14_tool49.part, mode=Mode.SUBTRACT)


with BuildPart() as f14_tool55:
    # F14_s56 → F14_t57 (new body)
    with BuildSketch(Plane.XZ.offset(-95)):
        with BuildLine():
            ThreePointArc((-7.5, 3), (-7.3535533906, 2.6464466094), (-7, 2.5))
            Line((-7, 2.5), (-7.5, 2.5))
            Line((-7.5, 2.5), (-7.5, 3))
        make_face()
    extrude(amount=F14_T57_DEPTH)

    split(bisect_by=Plane.XZ.offset(-84.5), keep=Keep.TOP)


with BuildPart() as f14_tool59:
    # F14_s60 → F14_t61 (new body)
    with BuildSketch(Plane.XY.offset(3.75)):
        with BuildLine():
            ThreePointArc((-7.5, 84), (-7.3535533906, 84.3535533906), (-7, 84.5))
            Line((-7, 84.5), (-7.5, 84.5))
            Line((-7.5, 84.5), (-7.5, 84))
        make_face()
    extrude(amount=-F14_T61_DEPTH)

    split(bisect_by=Plane.XY.offset(2.5), keep=Keep.TOP)


with BuildPart() as f14_tool55_1:
    add(f14_tool55.part)

    # F14_t63: intersect F14_tool59
    add(f14_tool59.part, mode=Mode.INTERSECT)


with BuildPart() as f1_6:
    add(f1_5.part)

    # F14_t53: cut F14_tool55
    add(f14_tool55_1.part, mode=Mode.SUBTRACT)


with BuildPart() as f14_tool66:
    # F14_s67 → F14_t68 (new body)
    with BuildSketch(Plane.XY.offset(2.5)):
        with BuildLine():
            ThreePointArc((-7.5, 84), (-7.3535533906, 84.3535533906), (-7, 84.5))
            Line((-7, 84.5), (-7.5, 84.5))
            Line((-7.5, 84.5), (-7.5, 84))
        make_face()
    extrude(amount=-F14_T68_DEPTH)

    split(bisect_by=Plane.XY.offset(-2.5), keep=Keep.BOTTOM)


with BuildPart() as f14_tool70:
    # F14_s71 → F14_t72 (new body)
    with BuildSketch(Plane.XZ.offset(-83.25)):
        with BuildLine():
            ThreePointArc((-7.5, -3), (-7.3535533906, -2.6464466094), (-7, -2.5))
            Line((-7, -2.5), (-7.5, -2.5))
            Line((-7.5, -2.5), (-7.5, -3))
        make_face()
    extrude(amount=-F14_T72_DEPTH)

    split(bisect_by=Plane.XZ.offset(-84.5), keep=Keep.TOP)


with BuildPart() as f14_tool66_1:
    add(f14_tool66.part)

    # F14_t74: intersect F14_tool70
    add(f14_tool70.part, mode=Mode.INTERSECT)


with BuildPart() as f1_7:
    add(f1_6.part)

    # F14_t64: cut F14_tool66
    add(f14_tool66_1.part, mode=Mode.SUBTRACT)


with BuildPart() as f14_tool77:
    # F14_s78 → F14_t79 (new body)
    with BuildSketch(Plane(origin=(0, 74.74590152, -6.4935785634), x_dir=(1, 0, 0), z_dir=(0, 0.9962475616, -0.086549385))):
        with BuildLine():
            ThreePointArc((-7, -11.6556464009), (-7.3535533906, -11.5091997915), (-7.5, -11.1556464009))
            Line((-7.5, -11.1556464009), (-7.5, -11.6556464009))
            Line((-7.5, -11.6556464009), (-7, -11.6556464009))
        make_face()
    extrude(amount=F14_T79_DEPTH)

    split(bisect_by=Plane.XZ.offset(-77.1167650819), keep=Keep.BOTTOM)


with BuildPart() as f14_tool81:
    # F14_s82 → F14_t83 (new body)
    with BuildSketch(Plane.XY.offset(3.75)):
        with BuildLine():
            ThreePointArc((-7.5, 77.6167650819), (-7.3535533906, 77.2632116913), (-7, 77.1167650819))
            Line((-7, 77.1167650819), (-7.5, 77.1167650819))
            Line((-7.5, 77.1167650819), (-7.5, 77.6167650819))
        make_face()
    extrude(amount=F14_T83_DEPTH)

    split(bisect_by=Plane(origin=(0, 1.0087890281, 11.6119093055), x_dir=(1, 0, 0), z_dir=(0, -0.086549385, -0.9962475616)), keep=Keep.TOP)


with BuildPart() as f14_tool77_1:
    add(f14_tool77.part)

    # F14_t85: intersect F14_tool81
    add(f14_tool81.part, mode=Mode.INTERSECT)


with BuildPart() as f1_8:
    add(f1_7.part)

    # F14_t75: cut F14_tool77
    add(f14_tool77_1.part, mode=Mode.SUBTRACT)


with BuildPart() as f14_tool88:
    # F14_s89 → F14_t90 (new body)
    with BuildSketch(Plane.XY.offset(3.75)):
        with BuildLine():
            ThreePointArc((7.5, 84), (7.3535533906, 84.3535533906), (7, 84.5))
            Line((7, 84.5), (7.5, 84.5))
            Line((7.5, 84.5), (7.5, 84))
        make_face()
    extrude(amount=-F14_T90_DEPTH)

    split(bisect_by=Plane.XY.offset(2.5), keep=Keep.TOP)


with BuildPart() as f14_tool92:
    # F14_s93 → F14_t94 (new body)
    with BuildSketch(Plane.XZ.offset(-95)):
        with BuildLine():
            ThreePointArc((7.5, 3), (7.3535533906, 2.6464466094), (7, 2.5))
            Line((7, 2.5), (7.5, 2.5))
            Line((7.5, 2.5), (7.5, 3))
        make_face()
    extrude(amount=F14_T94_DEPTH)

    split(bisect_by=Plane.XZ.offset(-84.5), keep=Keep.TOP)


with BuildPart() as f14_tool88_1:
    add(f14_tool88.part)

    # F14_t96: intersect F14_tool92
    add(f14_tool92.part, mode=Mode.INTERSECT)


with BuildPart() as f1_9:
    add(f1_8.part)

    # F14_t86: cut F14_tool88
    add(f14_tool88_1.part, mode=Mode.SUBTRACT)


with BuildPart() as f14_tool99:
    # F14_s100 → F14_t101 (new body)
    with BuildSketch(Plane.XZ.offset(-83.25)):
        with BuildLine():
            ThreePointArc((7.5, -3), (7.3535533906, -2.6464466094), (7, -2.5))
            Line((7, -2.5), (7.5, -2.5))
            Line((7.5, -2.5), (7.5, -3))
        make_face()
    extrude(amount=-F14_T101_DEPTH)

    split(bisect_by=Plane.XZ.offset(-84.5), keep=Keep.TOP)


with BuildPart() as f14_tool103:
    # F14_s104 → F14_t105 (new body)
    with BuildSketch(Plane.XY.offset(2.5)):
        with BuildLine():
            ThreePointArc((7.5, 84), (7.3535533906, 84.3535533906), (7, 84.5))
            Line((7, 84.5), (7.5, 84.5))
            Line((7.5, 84.5), (7.5, 84))
        make_face()
    extrude(amount=-F14_T105_DEPTH)

    split(bisect_by=Plane.XY.offset(-2.5), keep=Keep.BOTTOM)


with BuildPart() as f14_tool99_1:
    add(f14_tool99.part)

    # F14_t107: intersect F14_tool103
    add(f14_tool103.part, mode=Mode.INTERSECT)


with BuildPart() as f1_10:
    add(f1_9.part)

    # F14_t97: cut F14_tool99
    add(f14_tool99_1.part, mode=Mode.SUBTRACT)


solid = f1_10.part
